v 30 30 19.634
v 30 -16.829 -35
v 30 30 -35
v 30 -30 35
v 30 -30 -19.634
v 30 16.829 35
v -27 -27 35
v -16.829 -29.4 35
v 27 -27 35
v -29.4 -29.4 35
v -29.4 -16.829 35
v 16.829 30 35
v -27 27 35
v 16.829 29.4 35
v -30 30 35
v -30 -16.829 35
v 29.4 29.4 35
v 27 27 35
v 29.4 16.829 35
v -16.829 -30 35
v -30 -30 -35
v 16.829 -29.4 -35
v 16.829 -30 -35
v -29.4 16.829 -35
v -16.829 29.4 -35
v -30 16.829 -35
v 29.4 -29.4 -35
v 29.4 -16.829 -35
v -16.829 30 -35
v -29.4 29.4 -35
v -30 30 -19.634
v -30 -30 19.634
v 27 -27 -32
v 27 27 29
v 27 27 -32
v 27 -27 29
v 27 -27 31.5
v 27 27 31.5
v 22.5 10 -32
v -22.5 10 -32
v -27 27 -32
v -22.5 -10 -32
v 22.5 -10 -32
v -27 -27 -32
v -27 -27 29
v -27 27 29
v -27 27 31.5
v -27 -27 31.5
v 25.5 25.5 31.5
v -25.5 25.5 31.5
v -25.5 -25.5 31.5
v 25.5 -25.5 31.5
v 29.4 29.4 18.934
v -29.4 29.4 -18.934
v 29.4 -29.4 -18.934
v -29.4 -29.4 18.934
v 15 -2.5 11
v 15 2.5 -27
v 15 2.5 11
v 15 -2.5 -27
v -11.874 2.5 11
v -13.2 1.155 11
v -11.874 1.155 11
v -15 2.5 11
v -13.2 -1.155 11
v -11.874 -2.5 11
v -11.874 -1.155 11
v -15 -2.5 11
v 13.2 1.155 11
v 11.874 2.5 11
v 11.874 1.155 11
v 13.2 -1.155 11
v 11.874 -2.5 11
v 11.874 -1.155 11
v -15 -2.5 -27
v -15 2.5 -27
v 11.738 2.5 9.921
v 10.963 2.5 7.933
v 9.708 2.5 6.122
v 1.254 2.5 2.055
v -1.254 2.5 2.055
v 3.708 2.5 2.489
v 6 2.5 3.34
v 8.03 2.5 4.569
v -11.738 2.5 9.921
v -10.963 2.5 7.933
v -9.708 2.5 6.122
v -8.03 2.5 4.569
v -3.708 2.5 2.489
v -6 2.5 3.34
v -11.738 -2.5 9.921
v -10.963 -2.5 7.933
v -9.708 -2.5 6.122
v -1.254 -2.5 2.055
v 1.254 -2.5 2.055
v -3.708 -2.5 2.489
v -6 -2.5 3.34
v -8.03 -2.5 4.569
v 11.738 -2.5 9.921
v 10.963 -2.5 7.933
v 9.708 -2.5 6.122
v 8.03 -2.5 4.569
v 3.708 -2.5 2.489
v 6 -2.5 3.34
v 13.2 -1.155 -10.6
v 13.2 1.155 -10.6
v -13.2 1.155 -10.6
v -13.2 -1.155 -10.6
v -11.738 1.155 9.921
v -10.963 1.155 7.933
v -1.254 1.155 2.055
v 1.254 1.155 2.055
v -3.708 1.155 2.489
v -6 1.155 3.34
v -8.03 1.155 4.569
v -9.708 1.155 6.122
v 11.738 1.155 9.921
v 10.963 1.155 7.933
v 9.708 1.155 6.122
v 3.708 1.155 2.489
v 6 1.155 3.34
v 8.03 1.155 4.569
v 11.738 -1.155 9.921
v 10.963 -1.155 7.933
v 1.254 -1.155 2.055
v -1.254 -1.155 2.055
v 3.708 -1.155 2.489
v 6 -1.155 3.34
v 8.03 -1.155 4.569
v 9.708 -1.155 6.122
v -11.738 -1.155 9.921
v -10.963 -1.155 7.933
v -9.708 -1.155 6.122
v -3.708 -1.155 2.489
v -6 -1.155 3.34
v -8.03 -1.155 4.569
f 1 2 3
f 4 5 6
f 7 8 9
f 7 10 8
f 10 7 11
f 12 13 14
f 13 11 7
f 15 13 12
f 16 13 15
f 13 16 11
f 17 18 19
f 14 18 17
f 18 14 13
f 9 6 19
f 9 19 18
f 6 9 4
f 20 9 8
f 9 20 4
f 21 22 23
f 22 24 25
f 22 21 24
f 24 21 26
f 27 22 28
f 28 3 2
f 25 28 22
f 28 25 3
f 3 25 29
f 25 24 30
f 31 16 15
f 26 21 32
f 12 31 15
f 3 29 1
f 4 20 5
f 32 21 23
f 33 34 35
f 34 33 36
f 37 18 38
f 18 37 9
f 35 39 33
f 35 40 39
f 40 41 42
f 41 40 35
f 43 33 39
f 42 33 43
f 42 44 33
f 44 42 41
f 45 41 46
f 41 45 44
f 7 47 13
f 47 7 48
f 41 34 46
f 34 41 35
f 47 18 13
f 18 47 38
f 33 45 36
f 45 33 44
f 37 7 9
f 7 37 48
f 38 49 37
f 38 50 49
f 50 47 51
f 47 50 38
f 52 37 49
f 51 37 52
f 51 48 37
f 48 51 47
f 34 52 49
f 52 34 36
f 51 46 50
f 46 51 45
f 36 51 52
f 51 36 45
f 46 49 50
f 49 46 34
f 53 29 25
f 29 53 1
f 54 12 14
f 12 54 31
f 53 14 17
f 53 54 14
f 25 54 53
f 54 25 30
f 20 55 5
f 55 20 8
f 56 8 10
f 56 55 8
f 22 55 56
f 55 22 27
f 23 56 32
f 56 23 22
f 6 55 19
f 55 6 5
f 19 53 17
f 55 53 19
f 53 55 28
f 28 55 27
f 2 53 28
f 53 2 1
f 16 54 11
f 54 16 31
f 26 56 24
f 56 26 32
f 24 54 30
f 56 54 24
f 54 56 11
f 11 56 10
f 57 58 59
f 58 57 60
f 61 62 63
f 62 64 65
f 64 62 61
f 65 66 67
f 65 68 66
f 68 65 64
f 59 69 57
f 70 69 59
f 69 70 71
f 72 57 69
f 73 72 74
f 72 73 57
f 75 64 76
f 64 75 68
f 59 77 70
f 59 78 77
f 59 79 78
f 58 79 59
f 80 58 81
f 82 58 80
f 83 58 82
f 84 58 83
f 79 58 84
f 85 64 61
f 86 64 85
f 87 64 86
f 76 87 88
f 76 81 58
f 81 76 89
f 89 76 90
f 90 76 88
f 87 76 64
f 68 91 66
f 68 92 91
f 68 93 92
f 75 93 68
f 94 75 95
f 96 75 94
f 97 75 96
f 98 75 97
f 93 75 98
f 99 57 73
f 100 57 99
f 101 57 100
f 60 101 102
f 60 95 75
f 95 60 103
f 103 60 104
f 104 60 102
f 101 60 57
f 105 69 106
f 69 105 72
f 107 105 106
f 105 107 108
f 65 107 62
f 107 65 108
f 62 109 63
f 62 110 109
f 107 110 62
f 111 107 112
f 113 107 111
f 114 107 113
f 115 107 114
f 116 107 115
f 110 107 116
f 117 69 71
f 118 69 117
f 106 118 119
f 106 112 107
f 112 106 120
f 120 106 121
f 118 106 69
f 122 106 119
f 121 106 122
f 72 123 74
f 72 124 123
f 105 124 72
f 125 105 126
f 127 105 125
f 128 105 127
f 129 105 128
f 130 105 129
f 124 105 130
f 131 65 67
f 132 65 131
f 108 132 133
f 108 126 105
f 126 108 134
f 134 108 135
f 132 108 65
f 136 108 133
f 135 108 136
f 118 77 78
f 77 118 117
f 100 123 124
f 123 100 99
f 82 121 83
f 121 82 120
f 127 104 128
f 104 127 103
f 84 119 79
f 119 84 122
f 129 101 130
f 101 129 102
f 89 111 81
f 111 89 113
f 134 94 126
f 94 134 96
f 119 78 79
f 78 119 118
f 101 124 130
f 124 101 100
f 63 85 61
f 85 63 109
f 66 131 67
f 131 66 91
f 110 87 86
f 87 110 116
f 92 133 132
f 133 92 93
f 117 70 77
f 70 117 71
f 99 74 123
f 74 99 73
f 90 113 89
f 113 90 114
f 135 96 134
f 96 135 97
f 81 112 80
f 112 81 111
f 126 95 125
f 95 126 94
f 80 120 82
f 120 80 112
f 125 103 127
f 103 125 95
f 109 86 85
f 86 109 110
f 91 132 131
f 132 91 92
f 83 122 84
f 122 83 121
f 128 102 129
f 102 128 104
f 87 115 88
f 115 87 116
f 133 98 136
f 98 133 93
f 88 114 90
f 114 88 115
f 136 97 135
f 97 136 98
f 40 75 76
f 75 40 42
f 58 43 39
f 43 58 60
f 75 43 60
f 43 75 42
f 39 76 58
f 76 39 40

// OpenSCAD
pared = 3;
alto_caja = 70;
ancho_caja = 60;

alto_base_sd = 8;
alto_soporte_sd = 38; 

espesor_v = 1.2;
ancho_v = 20;

alto_tapa = 5;



module caja (){    
    difference(){cube([ancho_caja,ancho_caja,alto_caja], center=true);
    translate([0,0,pared])cube([ancho_caja-(pared*2),ancho_caja-(pared*2),alto_caja], center=true);}
}

module lineaV (){
    rotate([0,atan(ancho_caja/alto_caja),0])cube([ancho_v,espesor_v,alto_caja*ancho_caja], center=true);
}

module lineasv(){
    translate([0,(ancho_caja/2),0]) lineaV();
    translate([0,-(ancho_caja/2),0]) rotate([0,0,180])  lineaV();
    translate([(ancho_caja/2),00,0]) rotate([00,0,90])  lineaV();
    translate([-(ancho_caja/2),0,0]) rotate([0,0,270])  lineaV();
}

module sd(){
    translate([0,0,(alto_caja/2-alto_base_sd)*-1+alto_soporte_sd/2])
    difference(){
    //	SD Standard: 32.0×24.0×2.1 mm 
    cube([30,5,alto_soporte_sd], center =true);
    translate([0,0,15]) scale(1.1) cube([24,2.1,32], center =true);
    translate([0,0,20])
    rotate([90,0,0])scale([1.2,1,1])cylinder(h=10, r1=10, r2=10, center=true);
}}

module pisosd(){    
    translate([0,0,((alto_caja/2)-(pared/2))*-1])
hull(){
    translate([0,0,  alto_base_sd-pared])
        cube([30,5,pared], center = true);    
    cube([45,20,pared], center = true);    
//    scale([2,1,1])cylinder(h=3, r1=12, r2=12);
    }
}

module borde_tapa(){
translate([0,0,(alto_caja/2)-alto_tapa])
difference(){
cube([ancho_caja, ancho_caja, pared], center=true);

hull(){    
translate([0,0,pared/2 -1]) 
    cube([ancho_caja-pared *3, ancho_caja-(pared*3), 2], center=true);
translate([0,0, -pared/2]) 
    cube([ancho_caja-(pared*2), ancho_caja-(pared*2), 1], center=true);
};
}}



module caja_completa(){   
difference(){
union(){
    caja();
    borde_tapa();        
    }

lineasv();}

sd();
pisosd();
}


caja_completa();
